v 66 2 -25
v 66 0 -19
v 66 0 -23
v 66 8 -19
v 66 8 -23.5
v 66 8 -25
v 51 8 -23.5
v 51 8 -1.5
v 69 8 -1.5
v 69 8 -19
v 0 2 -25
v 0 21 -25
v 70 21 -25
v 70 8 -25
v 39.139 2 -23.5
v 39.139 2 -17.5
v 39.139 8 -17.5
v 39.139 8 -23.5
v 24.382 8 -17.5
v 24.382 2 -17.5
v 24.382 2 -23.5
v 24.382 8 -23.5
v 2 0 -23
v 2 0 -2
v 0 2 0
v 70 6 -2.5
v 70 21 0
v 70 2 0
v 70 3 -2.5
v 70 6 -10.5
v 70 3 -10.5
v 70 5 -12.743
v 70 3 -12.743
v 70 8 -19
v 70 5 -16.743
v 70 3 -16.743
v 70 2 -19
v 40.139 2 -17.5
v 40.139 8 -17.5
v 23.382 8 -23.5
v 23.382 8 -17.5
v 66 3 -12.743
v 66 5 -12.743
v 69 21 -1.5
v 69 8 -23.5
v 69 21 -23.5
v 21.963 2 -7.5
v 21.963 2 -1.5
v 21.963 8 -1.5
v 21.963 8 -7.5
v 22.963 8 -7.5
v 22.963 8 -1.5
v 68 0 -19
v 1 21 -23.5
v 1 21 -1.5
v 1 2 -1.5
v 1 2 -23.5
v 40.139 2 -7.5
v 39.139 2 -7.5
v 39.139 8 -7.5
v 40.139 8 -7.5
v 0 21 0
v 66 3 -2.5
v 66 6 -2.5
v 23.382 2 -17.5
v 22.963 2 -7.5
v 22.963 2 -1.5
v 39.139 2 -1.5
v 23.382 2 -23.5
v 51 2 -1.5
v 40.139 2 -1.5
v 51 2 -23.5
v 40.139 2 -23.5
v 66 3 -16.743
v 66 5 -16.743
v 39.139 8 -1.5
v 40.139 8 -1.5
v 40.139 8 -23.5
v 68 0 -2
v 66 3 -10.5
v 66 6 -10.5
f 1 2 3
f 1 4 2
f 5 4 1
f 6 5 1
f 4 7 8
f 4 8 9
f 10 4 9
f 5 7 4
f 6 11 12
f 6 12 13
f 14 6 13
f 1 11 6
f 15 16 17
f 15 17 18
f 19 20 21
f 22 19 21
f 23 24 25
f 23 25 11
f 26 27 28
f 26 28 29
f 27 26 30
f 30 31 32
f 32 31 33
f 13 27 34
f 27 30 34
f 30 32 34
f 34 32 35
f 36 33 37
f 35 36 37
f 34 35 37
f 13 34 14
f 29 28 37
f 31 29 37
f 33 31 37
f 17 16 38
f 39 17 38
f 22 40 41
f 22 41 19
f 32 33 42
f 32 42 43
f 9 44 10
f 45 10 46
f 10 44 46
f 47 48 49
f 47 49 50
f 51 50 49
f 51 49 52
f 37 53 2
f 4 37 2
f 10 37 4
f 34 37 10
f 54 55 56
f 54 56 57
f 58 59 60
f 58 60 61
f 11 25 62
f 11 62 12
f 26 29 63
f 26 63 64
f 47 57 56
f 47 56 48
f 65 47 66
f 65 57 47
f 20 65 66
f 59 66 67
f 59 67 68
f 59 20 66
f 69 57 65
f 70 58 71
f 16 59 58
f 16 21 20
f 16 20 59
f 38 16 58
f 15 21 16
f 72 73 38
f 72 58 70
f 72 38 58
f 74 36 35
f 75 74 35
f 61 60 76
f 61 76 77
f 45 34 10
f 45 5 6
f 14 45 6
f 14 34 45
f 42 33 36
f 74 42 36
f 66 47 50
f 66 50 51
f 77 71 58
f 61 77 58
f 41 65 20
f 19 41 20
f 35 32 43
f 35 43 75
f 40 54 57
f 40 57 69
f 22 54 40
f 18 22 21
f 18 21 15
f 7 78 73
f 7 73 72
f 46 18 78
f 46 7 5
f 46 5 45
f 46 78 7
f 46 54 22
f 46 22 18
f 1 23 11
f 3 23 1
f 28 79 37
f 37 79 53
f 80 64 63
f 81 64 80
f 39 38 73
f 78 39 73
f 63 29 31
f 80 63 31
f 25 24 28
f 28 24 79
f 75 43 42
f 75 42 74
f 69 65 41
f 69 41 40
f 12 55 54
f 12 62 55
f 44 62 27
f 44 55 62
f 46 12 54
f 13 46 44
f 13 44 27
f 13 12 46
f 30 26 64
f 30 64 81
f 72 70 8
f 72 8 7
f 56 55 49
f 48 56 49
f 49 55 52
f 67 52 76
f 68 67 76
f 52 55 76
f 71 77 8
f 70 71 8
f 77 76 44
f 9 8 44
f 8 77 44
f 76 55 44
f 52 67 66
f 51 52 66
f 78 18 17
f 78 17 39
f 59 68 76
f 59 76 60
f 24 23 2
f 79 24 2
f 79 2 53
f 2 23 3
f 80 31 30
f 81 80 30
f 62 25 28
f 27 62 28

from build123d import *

# Parameters (mm, degrees)
ESQUISSE1_W             = 70
ESQUISSE1_H             = 25
BOSS_EXTRU_1_DEPTH      = 21
ESQUISSE2_W             = 68
ESQUISSE2_H             = 22
ENL_V_MAT_EXTRU_1_DEPTH = 19
ESQUISSE3_W             = 18
ESQUISSE3_H             = 22
ESQUISSE3_W_2           = 1
ESQUISSE3_H_2           = 6
BOSS_EXTRU_2_DEPTH      = 6
ESQUISSE4_W             = 8
ESQUISSE4_H             = 3
ESQUISSE4_W_2           = 4
ESQUISSE4_H_2           = 2
ESQUISSE4_W_3           = 6
ESQUISSE4_H_3           = 8
ENL_V_MAT_EXTRU_2_DEPTH = 4
CHANFREIN1_SIZE         = 2


with BuildPart() as part:
    # Esquisse1 → Boss.-Extru.1 (new body)
    with BuildSketch(Plane(origin=(0, 0, 0), x_dir=(1, 0, 0), z_dir=(0, 1, 0))):
        with Locations((35, 12.5)):
            Rectangle(ESQUISSE1_W, ESQUISSE1_H)
    extrude(amount=BOSS_EXTRU_1_DEPTH)

    # Esquisse2 → Enlèv. mat.-Extru.1 (cut)
    with BuildSketch(Plane(origin=(0, 21, 0), x_dir=(1, 0, 0), z_dir=(0, 1, 0))):
        with Locations((35, 12.5)):
            Rectangle(ESQUISSE2_W, ESQUISSE2_H)
    extrude(amount=-ENL_V_MAT_EXTRU_1_DEPTH, mode=Mode.SUBTRACT)

    # Esquisse3 → Boss.-Extru.2 (add)
    with BuildSketch(Plane(origin=(0, 2, 0), x_dir=(1, 0, 0), z_dir=(0, 1, 0))):
        with Locations((60, 12.5)):
            Rectangle(ESQUISSE3_W, ESQUISSE3_H)
        with Locations((23.881932789, 20.5)):
            Rectangle(ESQUISSE3_W_2, ESQUISSE3_H_2)
        with Locations((39.638895705, 20.5)):
            Rectangle(ESQUISSE3_W_2, ESQUISSE3_H_2)
        with Locations((22.463097558, 4.5)):
            Rectangle(ESQUISSE3_W_2, ESQUISSE3_H_2)
        with Locations((39.638895705, 4.5)):
            Rectangle(ESQUISSE3_W_2, ESQUISSE3_H_2)
    extrude(amount=BOSS_EXTRU_2_DEPTH)

    # Esquisse4 → Enlèv. mat.-Extru.2 (cut)
    with BuildSketch(Plane(origin=(70, 0, 0), x_dir=(0, 0, -1), z_dir=(1, 0, 0))):
        with Locations((6.5, 4.5)):
            Rectangle(ESQUISSE4_W, ESQUISSE4_H)
        with Locations((14.742986582, 4)):
            Rectangle(ESQUISSE4_W_2, ESQUISSE4_H_2)
        with Locations((22, 4)):
            Rectangle(ESQUISSE4_W_3, ESQUISSE4_H_3)
    extrude(amount=-ENL_V_MAT_EXTRU_2_DEPTH, mode=Mode.SUBTRACT)

    # Chanfrein1
    chanfrein1_edges = [part.edges().sort_by_distance(p)[0] for p in [
        (33, 0, -25),
        (70, 0, -9.5),
        (35, 0, 0),
        (0, 0, -12.5),
    ]]
    chamfer(chanfrein1_edges, length=CHANFREIN1_SIZE)


solid = part.part
